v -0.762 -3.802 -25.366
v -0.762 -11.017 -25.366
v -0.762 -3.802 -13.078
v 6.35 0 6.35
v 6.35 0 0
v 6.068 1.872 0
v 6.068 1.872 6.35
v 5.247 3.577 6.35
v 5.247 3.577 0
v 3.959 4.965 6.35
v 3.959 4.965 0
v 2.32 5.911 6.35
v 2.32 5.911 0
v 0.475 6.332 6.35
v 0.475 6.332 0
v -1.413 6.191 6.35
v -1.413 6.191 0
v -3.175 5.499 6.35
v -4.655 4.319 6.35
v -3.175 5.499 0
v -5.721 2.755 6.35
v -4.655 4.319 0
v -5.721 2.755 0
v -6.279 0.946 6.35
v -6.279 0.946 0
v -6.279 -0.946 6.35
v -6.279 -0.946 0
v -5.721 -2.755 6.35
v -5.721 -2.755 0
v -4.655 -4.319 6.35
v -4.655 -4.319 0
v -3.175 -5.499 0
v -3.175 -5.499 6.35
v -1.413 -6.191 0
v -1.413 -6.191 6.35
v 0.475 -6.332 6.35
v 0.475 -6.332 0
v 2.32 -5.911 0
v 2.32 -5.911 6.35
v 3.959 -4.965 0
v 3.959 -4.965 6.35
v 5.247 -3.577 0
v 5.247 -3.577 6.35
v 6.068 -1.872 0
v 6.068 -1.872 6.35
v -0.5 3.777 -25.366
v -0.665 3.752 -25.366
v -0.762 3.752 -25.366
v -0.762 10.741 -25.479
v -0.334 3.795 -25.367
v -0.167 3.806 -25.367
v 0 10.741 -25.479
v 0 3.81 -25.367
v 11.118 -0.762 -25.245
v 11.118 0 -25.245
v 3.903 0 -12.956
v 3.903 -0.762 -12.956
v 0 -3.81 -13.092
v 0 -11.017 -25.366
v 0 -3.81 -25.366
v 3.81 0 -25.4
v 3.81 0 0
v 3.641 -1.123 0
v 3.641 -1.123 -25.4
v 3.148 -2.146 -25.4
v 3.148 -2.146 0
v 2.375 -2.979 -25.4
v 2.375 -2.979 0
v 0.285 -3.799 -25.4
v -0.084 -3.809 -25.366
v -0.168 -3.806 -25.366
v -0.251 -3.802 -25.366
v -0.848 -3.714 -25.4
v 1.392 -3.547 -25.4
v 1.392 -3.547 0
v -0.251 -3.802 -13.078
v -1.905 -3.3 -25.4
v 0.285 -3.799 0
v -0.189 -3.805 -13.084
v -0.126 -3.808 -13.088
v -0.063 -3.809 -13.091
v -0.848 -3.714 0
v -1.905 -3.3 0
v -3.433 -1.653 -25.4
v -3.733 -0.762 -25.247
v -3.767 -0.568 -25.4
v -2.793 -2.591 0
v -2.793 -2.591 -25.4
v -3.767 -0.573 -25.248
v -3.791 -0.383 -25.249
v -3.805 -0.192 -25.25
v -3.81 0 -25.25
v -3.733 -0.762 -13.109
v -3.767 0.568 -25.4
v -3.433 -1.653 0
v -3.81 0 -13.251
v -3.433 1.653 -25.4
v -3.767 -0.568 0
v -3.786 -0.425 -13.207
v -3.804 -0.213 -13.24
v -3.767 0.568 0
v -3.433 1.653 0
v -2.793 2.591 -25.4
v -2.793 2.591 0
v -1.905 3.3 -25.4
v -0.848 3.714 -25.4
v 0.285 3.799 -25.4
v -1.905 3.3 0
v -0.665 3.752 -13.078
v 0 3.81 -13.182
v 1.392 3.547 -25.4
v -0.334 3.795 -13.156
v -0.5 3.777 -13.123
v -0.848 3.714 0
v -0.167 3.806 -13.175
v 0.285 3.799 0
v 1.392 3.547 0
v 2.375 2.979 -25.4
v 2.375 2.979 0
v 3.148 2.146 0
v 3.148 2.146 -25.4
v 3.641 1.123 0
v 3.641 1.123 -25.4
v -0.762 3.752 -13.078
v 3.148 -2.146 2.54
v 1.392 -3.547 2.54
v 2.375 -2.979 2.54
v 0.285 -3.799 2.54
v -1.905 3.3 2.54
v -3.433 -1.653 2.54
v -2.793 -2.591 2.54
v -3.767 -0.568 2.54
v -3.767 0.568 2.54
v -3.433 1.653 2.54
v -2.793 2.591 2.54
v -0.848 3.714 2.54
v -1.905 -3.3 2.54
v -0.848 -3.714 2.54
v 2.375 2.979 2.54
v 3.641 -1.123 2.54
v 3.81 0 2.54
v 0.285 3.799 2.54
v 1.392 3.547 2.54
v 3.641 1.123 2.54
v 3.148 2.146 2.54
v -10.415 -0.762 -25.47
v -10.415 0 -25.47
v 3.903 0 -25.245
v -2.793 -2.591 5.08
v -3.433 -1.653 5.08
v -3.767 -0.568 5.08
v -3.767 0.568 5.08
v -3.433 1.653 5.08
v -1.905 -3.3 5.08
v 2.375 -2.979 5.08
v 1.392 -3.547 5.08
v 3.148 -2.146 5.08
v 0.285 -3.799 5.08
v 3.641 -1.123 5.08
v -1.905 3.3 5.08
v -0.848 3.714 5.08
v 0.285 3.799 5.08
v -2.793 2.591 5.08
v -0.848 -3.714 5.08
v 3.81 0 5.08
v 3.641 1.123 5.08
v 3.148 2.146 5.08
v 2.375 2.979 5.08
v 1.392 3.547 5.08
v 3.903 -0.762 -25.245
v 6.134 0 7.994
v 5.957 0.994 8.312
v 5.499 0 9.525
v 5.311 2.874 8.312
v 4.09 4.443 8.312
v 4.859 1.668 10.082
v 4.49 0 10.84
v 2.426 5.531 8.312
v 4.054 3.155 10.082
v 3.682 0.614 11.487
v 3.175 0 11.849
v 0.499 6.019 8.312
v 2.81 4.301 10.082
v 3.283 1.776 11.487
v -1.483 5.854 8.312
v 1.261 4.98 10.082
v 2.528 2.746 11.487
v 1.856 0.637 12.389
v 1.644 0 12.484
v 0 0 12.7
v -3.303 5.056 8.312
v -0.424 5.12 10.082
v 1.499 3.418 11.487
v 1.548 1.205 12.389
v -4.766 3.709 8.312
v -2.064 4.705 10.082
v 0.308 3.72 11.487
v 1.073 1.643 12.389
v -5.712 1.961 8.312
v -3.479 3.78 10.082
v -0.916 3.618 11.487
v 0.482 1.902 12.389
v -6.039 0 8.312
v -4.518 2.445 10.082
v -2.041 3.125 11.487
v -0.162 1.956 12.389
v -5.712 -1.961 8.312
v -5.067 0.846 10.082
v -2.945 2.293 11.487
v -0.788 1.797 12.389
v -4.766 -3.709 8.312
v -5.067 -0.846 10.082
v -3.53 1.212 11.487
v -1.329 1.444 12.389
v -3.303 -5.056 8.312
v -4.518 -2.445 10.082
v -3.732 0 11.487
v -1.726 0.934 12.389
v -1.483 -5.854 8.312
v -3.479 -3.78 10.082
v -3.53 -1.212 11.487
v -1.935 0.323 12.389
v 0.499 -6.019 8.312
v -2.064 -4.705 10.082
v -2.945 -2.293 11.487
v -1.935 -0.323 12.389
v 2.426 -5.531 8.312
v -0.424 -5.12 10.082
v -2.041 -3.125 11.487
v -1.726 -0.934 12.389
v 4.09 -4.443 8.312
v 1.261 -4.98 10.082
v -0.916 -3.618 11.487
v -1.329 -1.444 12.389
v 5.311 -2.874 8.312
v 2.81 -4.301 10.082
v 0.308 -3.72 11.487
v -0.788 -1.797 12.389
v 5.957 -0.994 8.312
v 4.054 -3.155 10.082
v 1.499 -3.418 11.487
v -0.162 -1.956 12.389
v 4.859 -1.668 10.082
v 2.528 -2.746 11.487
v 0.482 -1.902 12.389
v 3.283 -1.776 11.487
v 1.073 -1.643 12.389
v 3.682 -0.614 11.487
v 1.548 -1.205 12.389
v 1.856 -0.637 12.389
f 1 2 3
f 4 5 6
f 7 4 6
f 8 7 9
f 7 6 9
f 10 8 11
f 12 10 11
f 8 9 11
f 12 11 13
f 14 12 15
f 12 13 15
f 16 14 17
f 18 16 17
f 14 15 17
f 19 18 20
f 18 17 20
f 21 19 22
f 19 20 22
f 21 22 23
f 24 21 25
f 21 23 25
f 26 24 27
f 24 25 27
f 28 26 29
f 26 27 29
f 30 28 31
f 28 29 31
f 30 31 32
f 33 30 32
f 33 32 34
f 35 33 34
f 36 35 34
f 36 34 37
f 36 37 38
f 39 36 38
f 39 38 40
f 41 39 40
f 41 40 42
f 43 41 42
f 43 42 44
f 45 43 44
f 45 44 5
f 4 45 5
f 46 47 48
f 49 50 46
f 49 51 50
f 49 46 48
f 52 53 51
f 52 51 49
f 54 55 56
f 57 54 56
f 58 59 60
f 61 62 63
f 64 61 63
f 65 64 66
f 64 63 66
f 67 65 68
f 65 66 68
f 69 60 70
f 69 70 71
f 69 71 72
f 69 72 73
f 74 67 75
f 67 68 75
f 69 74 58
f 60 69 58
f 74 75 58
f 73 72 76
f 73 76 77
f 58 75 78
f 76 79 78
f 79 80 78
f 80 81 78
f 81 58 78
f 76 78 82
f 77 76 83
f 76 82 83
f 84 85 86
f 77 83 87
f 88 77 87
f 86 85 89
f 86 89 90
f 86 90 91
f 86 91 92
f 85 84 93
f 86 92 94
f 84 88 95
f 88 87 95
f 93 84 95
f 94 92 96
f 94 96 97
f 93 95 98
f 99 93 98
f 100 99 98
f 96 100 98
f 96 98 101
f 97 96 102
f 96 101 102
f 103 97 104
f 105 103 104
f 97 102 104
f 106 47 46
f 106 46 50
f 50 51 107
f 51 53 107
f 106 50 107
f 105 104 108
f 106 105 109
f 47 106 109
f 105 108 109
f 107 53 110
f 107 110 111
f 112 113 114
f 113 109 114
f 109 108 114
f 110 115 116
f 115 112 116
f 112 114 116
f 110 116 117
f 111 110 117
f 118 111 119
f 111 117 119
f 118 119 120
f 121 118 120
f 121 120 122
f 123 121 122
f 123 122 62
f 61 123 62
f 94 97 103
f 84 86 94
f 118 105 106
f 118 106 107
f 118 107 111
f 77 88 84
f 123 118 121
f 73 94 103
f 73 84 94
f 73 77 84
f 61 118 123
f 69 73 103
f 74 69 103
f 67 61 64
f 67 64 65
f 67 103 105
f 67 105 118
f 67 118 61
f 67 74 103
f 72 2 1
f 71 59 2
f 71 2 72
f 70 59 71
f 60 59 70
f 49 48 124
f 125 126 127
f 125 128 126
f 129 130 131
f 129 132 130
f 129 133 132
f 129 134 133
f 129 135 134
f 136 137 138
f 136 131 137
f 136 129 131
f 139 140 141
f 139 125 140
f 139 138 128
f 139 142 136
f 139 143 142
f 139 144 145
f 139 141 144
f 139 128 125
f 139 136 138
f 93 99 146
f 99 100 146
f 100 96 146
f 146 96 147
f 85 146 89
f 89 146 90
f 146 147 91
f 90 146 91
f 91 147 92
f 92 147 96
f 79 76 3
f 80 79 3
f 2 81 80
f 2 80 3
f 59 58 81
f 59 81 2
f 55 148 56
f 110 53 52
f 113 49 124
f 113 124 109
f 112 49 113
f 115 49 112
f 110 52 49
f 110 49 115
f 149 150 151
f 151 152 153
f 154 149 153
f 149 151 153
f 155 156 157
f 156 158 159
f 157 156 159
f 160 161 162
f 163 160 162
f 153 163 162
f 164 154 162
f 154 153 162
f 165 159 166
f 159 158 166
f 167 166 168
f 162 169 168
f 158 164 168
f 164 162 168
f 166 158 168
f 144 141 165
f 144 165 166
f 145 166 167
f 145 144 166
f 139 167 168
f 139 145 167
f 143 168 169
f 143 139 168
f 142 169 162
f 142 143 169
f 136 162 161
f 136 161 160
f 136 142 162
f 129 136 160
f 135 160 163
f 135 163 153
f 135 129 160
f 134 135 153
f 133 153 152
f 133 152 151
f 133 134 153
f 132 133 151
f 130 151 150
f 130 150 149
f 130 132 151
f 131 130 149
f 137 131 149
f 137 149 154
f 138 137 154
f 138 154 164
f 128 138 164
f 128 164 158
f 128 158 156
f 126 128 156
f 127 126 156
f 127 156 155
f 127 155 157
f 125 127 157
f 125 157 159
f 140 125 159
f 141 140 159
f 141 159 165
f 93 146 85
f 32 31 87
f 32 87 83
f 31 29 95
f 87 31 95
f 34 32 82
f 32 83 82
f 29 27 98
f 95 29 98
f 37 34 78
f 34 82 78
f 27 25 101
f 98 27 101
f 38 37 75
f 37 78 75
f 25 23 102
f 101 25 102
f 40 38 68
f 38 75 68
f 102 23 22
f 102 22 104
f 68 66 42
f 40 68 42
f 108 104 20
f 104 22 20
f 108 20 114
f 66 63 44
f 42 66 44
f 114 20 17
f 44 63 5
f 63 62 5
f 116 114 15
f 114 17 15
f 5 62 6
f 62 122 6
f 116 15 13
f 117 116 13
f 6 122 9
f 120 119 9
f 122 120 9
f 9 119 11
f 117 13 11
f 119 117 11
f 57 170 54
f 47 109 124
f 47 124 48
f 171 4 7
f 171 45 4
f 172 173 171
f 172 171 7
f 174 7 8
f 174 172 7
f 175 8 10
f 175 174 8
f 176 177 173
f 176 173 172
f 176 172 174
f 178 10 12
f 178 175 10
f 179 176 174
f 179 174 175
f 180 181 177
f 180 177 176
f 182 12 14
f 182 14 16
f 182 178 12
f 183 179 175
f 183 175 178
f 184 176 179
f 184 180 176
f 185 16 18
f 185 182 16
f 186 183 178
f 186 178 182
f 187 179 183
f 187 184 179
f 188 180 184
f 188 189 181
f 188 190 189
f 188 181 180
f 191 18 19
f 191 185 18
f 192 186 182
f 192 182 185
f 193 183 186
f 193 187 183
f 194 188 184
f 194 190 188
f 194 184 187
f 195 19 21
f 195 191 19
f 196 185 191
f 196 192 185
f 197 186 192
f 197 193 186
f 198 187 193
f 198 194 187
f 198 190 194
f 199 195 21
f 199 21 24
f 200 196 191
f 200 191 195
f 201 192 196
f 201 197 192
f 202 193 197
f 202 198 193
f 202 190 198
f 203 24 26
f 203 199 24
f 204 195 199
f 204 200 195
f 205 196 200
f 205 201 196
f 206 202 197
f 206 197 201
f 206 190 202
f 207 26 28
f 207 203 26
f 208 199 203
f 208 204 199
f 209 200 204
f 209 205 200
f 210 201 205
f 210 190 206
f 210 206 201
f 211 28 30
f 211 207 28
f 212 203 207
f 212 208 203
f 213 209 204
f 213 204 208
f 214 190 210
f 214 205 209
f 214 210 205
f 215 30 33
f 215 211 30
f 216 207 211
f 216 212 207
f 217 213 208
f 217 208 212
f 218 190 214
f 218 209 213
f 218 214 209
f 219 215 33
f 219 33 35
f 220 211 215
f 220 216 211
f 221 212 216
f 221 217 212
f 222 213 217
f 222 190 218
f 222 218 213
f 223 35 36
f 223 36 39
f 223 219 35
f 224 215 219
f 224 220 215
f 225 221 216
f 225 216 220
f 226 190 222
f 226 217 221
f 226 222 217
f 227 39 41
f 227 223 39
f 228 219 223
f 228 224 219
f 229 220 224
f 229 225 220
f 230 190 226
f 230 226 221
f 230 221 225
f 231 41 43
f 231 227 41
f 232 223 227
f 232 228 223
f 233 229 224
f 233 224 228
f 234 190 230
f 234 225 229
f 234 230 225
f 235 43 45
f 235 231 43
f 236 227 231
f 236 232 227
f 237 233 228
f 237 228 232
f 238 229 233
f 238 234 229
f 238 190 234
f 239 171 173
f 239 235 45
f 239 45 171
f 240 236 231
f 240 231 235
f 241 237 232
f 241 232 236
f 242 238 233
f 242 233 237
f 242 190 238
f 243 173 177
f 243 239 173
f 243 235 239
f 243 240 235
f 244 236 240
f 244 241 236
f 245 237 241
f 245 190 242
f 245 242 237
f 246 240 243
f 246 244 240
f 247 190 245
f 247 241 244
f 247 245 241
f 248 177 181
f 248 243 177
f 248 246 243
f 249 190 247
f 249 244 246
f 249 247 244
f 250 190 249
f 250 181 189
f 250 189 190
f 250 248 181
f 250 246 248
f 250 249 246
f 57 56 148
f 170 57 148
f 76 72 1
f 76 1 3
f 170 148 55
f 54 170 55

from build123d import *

# Parameters (mm, degrees)
F0_R      = 6.35
F1_DEPTH  = 5.08
F2_T      = -2.54
F3_R      = 6.35
F4_DEPTH  = 7.62
F5_R      = 6.35
F6_R      = 3.81
F7_DEPTH  = 25.4
F9_DEPTH  = 0.762
F11_DEPTH = 0.762


with BuildPart() as f1:
    # F0 (on Top) → F1 (new body)
    with BuildSketch(Plane.XY):
        Circle(F0_R)
    extrude(amount=F1_DEPTH)

    # F2
    f2_openings = [f1.faces().sort_by_distance(p)[0] for p in [
        (0, 0, 5.08),
    ]]
    offset(amount=F2_T, openings=f2_openings)

    # F3 (on face) → F4 (join)
    with BuildSketch(Plane.XY.offset(5.08)):
        Circle(F3_R)
    extrude(amount=F4_DEPTH)

    # F5
    f5_edges = [f1.edges().sort_by_distance(p)[0] for p in [
        (-6.35, 0, 12.7),
    ]]
    fillet(f5_edges, radius=F5_R)

    # F6 (on face) → F7 (join)
    with BuildSketch(Plane(origin=(0, 0, 0), x_dir=(1, 0, 0), z_dir=(0, 0, -1))):
        Circle(F6_R)
    extrude(amount=F7_DEPTH)

    # F8 (on Right) → F9 (join)
    with BuildSketch(Plane.YZ):
        Polygon((3.751557786, -13.0778392777), (3.751557786, -25.3659710288), (10.7411369681, -25.4787057638), align=None)
        Polygon((-11.0167460516, -25.3659710288), (-3.8016969338, -25.3659710288), (-3.8016969338, -13.0778392777), align=None)
    extrude(amount=-F9_DEPTH)

    # F10 (on Front) → F11 (join)
    with BuildSketch(Plane.XZ):
        Polygon((-10.4146469384, -25.4699978977), (-3.6505381577, -25.2445284277), (-3.6505381577, -12.9563966766), align=None)
    extrude(amount=F11_DEPTH)


with BuildPart() as f11:
    # F10 (on Front) → F11, piece 2 (new body)
    with BuildSketch(Plane.XZ):
        Polygon((3.902716795, -12.9563966766), (3.902716795, -25.2445284277), (11.11776568, -25.2445284277), align=None)
    extrude(amount=F11_DEPTH)


solid = Compound([f1.part, f11.part])
